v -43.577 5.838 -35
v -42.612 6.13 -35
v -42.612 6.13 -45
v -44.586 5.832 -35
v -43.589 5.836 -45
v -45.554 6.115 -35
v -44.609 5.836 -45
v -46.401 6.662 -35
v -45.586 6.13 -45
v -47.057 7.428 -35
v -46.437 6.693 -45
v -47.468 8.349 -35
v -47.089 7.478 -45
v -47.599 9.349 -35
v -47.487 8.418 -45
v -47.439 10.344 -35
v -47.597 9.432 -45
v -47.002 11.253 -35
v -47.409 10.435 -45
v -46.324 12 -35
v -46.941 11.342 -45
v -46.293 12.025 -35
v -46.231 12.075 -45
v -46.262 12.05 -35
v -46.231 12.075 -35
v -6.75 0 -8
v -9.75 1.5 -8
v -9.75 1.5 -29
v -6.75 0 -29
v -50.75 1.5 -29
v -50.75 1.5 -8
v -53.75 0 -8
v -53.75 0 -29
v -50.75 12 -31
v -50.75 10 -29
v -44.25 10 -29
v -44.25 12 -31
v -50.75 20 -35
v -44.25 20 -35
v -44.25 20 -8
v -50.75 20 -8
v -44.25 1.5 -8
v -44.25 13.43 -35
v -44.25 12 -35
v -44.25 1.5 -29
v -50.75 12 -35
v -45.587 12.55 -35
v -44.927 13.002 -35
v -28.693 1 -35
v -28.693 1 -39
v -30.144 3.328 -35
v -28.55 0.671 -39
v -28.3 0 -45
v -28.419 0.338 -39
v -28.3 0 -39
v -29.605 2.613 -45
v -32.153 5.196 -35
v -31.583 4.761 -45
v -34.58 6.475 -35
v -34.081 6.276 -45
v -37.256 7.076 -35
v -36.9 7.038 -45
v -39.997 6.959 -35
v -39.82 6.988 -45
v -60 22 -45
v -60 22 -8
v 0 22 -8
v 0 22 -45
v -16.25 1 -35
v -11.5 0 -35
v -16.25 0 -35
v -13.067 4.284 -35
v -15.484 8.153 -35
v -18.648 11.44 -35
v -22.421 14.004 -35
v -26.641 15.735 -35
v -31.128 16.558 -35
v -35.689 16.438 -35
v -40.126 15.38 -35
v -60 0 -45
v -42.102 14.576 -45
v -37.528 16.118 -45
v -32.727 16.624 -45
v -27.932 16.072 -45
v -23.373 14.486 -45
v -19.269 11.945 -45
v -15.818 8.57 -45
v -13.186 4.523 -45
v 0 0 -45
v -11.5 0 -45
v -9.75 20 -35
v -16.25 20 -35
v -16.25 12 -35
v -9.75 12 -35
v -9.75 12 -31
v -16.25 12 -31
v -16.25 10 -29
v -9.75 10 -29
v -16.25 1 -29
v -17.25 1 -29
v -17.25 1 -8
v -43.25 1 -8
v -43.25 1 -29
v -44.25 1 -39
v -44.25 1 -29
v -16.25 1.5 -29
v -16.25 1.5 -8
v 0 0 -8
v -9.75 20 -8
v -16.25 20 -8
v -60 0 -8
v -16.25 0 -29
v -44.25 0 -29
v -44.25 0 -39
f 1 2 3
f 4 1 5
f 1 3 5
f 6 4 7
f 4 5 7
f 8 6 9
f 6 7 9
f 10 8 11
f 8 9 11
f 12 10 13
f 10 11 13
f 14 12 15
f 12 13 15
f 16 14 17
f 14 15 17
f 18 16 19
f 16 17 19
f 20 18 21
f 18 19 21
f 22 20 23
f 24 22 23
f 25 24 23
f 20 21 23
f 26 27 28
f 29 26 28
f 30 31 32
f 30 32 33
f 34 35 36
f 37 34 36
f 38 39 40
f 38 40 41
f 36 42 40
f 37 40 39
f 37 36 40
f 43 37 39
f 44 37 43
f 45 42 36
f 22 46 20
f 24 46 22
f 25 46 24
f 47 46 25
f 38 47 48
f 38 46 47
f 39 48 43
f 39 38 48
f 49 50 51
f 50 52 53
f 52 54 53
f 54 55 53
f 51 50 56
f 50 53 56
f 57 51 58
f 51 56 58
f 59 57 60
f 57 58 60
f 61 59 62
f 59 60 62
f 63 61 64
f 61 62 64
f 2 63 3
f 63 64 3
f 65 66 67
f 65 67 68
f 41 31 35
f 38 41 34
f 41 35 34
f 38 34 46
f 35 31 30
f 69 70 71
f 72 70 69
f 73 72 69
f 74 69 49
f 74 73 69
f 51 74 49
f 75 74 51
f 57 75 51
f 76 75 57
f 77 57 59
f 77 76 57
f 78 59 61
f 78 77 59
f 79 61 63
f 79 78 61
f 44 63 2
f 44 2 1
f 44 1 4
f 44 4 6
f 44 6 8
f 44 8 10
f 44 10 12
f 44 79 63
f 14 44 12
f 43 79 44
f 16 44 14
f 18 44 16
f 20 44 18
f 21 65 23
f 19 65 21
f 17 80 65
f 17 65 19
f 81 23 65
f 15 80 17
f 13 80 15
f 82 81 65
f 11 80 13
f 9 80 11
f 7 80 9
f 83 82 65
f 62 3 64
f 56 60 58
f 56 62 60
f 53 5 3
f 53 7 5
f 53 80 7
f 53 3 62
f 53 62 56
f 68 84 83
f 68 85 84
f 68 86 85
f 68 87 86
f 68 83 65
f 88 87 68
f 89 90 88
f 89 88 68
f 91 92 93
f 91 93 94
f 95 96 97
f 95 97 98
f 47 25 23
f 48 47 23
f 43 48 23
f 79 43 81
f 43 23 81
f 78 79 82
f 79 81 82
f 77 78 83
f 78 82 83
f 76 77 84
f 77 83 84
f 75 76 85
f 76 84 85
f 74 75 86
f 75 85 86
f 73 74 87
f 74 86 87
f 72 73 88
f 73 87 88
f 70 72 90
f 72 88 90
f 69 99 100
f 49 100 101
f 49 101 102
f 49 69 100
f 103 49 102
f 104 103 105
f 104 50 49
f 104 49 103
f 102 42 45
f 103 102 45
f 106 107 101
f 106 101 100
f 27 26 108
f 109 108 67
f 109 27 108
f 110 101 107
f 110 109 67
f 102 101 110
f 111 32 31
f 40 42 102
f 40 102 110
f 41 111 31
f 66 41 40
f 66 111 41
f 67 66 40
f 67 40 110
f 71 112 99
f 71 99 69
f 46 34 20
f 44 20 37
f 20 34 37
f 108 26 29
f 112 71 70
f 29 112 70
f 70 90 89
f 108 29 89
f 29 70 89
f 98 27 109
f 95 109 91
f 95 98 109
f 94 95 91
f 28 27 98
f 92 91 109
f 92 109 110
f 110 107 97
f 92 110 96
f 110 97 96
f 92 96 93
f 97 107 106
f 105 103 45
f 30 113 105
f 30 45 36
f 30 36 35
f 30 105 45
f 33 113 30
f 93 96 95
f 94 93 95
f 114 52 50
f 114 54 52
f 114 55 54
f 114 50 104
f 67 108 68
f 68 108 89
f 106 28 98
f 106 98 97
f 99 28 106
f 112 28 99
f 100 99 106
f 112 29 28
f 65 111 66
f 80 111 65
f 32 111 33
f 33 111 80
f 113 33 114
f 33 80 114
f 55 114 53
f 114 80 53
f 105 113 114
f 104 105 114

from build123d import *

# Parameters (mm, degrees)
SKETCH1_W           = 60
SKETCH1_H           = 45
BOSS_EXTRUDE1_DEPTH = 30
SKETCH2_W           = 6.5
SKETCH2_H           = 22
CUT_EXTRUDE1_DEPTH  = 20
CUT_EXTRUDE2_DEPTH  = 10
CHAMFER3_SIZE       = 3
CHAMFER3_SIZE2      = 1.5
CUT_EXTRUDE3_REACH  = 82.777
SKETCH6_W           = 28
SKETCH6_H           = 31
CUT_EXTRUDE4_DEPTH  = 1
SKETCH7_W           = 6.5
SKETCH7_H           = 8
CUT_EXTRUDE5_DEPTH  = 6
CHAMFER4_SIZE       = 2


with BuildPart() as part:
    # Sketch1 → Boss-Extrude1 (new body)
    with BuildSketch(Plane(origin=(0, 0, 0), x_dir=(1, 0, 0), z_dir=(0, 1, 0))):
        with Locations((-30, 22.5)):
            Rectangle(SKETCH1_W, SKETCH1_H)
    extrude(amount=BOSS_EXTRUDE1_DEPTH)

    # Sketch2 → Cut-Extrude1 (cut)
    with BuildSketch(Plane(origin=(0, 0, 0), x_dir=(-1, 0, 0), z_dir=(0, -1, 0))):
        with Locations((47.5, 18)):
            Rectangle(SKETCH2_W, SKETCH2_H)
        with Locations((13, 18)):
            Rectangle(SKETCH2_W, SKETCH2_H)
    extrude(amount=-CUT_EXTRUDE1_DEPTH, mode=Mode.SUBTRACT)

    # Sketch4 → Cut-Extrude2 (cut)
    with BuildSketch(Plane(origin=(0, 0, -45), x_dir=(-1, 0, 0), z_dir=(0, 0, -1))):
        with BuildLine():
            Line((11.5, 0), (28.3, 0))
            ThreePointArc((28.3, 0), (34.080602383, 6.276082414), (42.61191296, 6.13008847))
            ThreePointArc((42.61191296, 6.13008847), (47.088831578, 7.478397416), (46.230644896, 12.074510224))
            ThreePointArc((46.230644896, 12.074510224), (25.608734298, 15.404376803), (11.5, 0))
        make_face()
    extrude(amount=-CUT_EXTRUDE2_DEPTH, mode=Mode.SUBTRACT)

    # Chamfer3
    chamfer3_edges = [part.edges().sort_by_distance(p)[0] for p in [
        (-50.75, 0, -18),
        (-44.25, 0, -18),
        (-47.5, 0, -7),
        (-16.25, 0, -18),
        (-9.75, 0, -18),
        (-13, 0, -7),
    ]]
    chamfer3_side = [part.faces().sort_by_distance(p)[0] for p in [
        (-30.72364203, 0, -21.764024933),
    ]]
    chamfer(chamfer3_edges, length=CHAMFER3_SIZE, length2=CHAMFER3_SIZE2, reference=chamfer3_side[0])

    # Sketch5 → Cut-Extrude3 (cut, up to next)
    with BuildSketch(Plane.ZY.offset(60), mode=Mode.PRIVATE) as cut_extrude3_sk1:
        Polygon((-45, 30), (0, 30), (0, 0), (-8, 0), (-8, 22), (-45, 22), align=None)
    cut_extrude3_tool1 = extrude(cut_extrude3_sk1.sketch, amount=-CUT_EXTRUDE3_REACH, mode=Mode.PRIVATE) & part.part
    add(cut_extrude3_tool1.solids().sort_by_distance((-60, 29.459167, -22.5))[0], mode=Mode.SUBTRACT)

    # Sketch6 → Cut-Extrude4 (cut)
    with BuildSketch(Plane(origin=(0, 0, 0), x_dir=(-1, 0, 0), z_dir=(0, -1, 0))):
        with Locations((30.25, 23.5)):
            Rectangle(SKETCH6_W, SKETCH6_H)
    extrude(amount=-CUT_EXTRUDE4_DEPTH, mode=Mode.SUBTRACT)

    # Sketch7 → Cut-Extrude5 (cut)
    with BuildSketch(Plane.XY.offset(-29)):
        with Locations((-13, 16)):
            Rectangle(SKETCH7_W, SKETCH7_H)
        with Locations((-47.5, 16)):
            Rectangle(SKETCH7_W, SKETCH7_H)
    extrude(amount=-CUT_EXTRUDE5_DEPTH, mode=Mode.SUBTRACT)

    # Chamfer4
    chamfer4_edges = [part.edges().sort_by_distance(p)[0] for p in [
        (-13, 12, -29),
        (-47.5, 12, -29),
    ]]
    chamfer(chamfer4_edges, length=CHAMFER4_SIZE)


solid = part.part
